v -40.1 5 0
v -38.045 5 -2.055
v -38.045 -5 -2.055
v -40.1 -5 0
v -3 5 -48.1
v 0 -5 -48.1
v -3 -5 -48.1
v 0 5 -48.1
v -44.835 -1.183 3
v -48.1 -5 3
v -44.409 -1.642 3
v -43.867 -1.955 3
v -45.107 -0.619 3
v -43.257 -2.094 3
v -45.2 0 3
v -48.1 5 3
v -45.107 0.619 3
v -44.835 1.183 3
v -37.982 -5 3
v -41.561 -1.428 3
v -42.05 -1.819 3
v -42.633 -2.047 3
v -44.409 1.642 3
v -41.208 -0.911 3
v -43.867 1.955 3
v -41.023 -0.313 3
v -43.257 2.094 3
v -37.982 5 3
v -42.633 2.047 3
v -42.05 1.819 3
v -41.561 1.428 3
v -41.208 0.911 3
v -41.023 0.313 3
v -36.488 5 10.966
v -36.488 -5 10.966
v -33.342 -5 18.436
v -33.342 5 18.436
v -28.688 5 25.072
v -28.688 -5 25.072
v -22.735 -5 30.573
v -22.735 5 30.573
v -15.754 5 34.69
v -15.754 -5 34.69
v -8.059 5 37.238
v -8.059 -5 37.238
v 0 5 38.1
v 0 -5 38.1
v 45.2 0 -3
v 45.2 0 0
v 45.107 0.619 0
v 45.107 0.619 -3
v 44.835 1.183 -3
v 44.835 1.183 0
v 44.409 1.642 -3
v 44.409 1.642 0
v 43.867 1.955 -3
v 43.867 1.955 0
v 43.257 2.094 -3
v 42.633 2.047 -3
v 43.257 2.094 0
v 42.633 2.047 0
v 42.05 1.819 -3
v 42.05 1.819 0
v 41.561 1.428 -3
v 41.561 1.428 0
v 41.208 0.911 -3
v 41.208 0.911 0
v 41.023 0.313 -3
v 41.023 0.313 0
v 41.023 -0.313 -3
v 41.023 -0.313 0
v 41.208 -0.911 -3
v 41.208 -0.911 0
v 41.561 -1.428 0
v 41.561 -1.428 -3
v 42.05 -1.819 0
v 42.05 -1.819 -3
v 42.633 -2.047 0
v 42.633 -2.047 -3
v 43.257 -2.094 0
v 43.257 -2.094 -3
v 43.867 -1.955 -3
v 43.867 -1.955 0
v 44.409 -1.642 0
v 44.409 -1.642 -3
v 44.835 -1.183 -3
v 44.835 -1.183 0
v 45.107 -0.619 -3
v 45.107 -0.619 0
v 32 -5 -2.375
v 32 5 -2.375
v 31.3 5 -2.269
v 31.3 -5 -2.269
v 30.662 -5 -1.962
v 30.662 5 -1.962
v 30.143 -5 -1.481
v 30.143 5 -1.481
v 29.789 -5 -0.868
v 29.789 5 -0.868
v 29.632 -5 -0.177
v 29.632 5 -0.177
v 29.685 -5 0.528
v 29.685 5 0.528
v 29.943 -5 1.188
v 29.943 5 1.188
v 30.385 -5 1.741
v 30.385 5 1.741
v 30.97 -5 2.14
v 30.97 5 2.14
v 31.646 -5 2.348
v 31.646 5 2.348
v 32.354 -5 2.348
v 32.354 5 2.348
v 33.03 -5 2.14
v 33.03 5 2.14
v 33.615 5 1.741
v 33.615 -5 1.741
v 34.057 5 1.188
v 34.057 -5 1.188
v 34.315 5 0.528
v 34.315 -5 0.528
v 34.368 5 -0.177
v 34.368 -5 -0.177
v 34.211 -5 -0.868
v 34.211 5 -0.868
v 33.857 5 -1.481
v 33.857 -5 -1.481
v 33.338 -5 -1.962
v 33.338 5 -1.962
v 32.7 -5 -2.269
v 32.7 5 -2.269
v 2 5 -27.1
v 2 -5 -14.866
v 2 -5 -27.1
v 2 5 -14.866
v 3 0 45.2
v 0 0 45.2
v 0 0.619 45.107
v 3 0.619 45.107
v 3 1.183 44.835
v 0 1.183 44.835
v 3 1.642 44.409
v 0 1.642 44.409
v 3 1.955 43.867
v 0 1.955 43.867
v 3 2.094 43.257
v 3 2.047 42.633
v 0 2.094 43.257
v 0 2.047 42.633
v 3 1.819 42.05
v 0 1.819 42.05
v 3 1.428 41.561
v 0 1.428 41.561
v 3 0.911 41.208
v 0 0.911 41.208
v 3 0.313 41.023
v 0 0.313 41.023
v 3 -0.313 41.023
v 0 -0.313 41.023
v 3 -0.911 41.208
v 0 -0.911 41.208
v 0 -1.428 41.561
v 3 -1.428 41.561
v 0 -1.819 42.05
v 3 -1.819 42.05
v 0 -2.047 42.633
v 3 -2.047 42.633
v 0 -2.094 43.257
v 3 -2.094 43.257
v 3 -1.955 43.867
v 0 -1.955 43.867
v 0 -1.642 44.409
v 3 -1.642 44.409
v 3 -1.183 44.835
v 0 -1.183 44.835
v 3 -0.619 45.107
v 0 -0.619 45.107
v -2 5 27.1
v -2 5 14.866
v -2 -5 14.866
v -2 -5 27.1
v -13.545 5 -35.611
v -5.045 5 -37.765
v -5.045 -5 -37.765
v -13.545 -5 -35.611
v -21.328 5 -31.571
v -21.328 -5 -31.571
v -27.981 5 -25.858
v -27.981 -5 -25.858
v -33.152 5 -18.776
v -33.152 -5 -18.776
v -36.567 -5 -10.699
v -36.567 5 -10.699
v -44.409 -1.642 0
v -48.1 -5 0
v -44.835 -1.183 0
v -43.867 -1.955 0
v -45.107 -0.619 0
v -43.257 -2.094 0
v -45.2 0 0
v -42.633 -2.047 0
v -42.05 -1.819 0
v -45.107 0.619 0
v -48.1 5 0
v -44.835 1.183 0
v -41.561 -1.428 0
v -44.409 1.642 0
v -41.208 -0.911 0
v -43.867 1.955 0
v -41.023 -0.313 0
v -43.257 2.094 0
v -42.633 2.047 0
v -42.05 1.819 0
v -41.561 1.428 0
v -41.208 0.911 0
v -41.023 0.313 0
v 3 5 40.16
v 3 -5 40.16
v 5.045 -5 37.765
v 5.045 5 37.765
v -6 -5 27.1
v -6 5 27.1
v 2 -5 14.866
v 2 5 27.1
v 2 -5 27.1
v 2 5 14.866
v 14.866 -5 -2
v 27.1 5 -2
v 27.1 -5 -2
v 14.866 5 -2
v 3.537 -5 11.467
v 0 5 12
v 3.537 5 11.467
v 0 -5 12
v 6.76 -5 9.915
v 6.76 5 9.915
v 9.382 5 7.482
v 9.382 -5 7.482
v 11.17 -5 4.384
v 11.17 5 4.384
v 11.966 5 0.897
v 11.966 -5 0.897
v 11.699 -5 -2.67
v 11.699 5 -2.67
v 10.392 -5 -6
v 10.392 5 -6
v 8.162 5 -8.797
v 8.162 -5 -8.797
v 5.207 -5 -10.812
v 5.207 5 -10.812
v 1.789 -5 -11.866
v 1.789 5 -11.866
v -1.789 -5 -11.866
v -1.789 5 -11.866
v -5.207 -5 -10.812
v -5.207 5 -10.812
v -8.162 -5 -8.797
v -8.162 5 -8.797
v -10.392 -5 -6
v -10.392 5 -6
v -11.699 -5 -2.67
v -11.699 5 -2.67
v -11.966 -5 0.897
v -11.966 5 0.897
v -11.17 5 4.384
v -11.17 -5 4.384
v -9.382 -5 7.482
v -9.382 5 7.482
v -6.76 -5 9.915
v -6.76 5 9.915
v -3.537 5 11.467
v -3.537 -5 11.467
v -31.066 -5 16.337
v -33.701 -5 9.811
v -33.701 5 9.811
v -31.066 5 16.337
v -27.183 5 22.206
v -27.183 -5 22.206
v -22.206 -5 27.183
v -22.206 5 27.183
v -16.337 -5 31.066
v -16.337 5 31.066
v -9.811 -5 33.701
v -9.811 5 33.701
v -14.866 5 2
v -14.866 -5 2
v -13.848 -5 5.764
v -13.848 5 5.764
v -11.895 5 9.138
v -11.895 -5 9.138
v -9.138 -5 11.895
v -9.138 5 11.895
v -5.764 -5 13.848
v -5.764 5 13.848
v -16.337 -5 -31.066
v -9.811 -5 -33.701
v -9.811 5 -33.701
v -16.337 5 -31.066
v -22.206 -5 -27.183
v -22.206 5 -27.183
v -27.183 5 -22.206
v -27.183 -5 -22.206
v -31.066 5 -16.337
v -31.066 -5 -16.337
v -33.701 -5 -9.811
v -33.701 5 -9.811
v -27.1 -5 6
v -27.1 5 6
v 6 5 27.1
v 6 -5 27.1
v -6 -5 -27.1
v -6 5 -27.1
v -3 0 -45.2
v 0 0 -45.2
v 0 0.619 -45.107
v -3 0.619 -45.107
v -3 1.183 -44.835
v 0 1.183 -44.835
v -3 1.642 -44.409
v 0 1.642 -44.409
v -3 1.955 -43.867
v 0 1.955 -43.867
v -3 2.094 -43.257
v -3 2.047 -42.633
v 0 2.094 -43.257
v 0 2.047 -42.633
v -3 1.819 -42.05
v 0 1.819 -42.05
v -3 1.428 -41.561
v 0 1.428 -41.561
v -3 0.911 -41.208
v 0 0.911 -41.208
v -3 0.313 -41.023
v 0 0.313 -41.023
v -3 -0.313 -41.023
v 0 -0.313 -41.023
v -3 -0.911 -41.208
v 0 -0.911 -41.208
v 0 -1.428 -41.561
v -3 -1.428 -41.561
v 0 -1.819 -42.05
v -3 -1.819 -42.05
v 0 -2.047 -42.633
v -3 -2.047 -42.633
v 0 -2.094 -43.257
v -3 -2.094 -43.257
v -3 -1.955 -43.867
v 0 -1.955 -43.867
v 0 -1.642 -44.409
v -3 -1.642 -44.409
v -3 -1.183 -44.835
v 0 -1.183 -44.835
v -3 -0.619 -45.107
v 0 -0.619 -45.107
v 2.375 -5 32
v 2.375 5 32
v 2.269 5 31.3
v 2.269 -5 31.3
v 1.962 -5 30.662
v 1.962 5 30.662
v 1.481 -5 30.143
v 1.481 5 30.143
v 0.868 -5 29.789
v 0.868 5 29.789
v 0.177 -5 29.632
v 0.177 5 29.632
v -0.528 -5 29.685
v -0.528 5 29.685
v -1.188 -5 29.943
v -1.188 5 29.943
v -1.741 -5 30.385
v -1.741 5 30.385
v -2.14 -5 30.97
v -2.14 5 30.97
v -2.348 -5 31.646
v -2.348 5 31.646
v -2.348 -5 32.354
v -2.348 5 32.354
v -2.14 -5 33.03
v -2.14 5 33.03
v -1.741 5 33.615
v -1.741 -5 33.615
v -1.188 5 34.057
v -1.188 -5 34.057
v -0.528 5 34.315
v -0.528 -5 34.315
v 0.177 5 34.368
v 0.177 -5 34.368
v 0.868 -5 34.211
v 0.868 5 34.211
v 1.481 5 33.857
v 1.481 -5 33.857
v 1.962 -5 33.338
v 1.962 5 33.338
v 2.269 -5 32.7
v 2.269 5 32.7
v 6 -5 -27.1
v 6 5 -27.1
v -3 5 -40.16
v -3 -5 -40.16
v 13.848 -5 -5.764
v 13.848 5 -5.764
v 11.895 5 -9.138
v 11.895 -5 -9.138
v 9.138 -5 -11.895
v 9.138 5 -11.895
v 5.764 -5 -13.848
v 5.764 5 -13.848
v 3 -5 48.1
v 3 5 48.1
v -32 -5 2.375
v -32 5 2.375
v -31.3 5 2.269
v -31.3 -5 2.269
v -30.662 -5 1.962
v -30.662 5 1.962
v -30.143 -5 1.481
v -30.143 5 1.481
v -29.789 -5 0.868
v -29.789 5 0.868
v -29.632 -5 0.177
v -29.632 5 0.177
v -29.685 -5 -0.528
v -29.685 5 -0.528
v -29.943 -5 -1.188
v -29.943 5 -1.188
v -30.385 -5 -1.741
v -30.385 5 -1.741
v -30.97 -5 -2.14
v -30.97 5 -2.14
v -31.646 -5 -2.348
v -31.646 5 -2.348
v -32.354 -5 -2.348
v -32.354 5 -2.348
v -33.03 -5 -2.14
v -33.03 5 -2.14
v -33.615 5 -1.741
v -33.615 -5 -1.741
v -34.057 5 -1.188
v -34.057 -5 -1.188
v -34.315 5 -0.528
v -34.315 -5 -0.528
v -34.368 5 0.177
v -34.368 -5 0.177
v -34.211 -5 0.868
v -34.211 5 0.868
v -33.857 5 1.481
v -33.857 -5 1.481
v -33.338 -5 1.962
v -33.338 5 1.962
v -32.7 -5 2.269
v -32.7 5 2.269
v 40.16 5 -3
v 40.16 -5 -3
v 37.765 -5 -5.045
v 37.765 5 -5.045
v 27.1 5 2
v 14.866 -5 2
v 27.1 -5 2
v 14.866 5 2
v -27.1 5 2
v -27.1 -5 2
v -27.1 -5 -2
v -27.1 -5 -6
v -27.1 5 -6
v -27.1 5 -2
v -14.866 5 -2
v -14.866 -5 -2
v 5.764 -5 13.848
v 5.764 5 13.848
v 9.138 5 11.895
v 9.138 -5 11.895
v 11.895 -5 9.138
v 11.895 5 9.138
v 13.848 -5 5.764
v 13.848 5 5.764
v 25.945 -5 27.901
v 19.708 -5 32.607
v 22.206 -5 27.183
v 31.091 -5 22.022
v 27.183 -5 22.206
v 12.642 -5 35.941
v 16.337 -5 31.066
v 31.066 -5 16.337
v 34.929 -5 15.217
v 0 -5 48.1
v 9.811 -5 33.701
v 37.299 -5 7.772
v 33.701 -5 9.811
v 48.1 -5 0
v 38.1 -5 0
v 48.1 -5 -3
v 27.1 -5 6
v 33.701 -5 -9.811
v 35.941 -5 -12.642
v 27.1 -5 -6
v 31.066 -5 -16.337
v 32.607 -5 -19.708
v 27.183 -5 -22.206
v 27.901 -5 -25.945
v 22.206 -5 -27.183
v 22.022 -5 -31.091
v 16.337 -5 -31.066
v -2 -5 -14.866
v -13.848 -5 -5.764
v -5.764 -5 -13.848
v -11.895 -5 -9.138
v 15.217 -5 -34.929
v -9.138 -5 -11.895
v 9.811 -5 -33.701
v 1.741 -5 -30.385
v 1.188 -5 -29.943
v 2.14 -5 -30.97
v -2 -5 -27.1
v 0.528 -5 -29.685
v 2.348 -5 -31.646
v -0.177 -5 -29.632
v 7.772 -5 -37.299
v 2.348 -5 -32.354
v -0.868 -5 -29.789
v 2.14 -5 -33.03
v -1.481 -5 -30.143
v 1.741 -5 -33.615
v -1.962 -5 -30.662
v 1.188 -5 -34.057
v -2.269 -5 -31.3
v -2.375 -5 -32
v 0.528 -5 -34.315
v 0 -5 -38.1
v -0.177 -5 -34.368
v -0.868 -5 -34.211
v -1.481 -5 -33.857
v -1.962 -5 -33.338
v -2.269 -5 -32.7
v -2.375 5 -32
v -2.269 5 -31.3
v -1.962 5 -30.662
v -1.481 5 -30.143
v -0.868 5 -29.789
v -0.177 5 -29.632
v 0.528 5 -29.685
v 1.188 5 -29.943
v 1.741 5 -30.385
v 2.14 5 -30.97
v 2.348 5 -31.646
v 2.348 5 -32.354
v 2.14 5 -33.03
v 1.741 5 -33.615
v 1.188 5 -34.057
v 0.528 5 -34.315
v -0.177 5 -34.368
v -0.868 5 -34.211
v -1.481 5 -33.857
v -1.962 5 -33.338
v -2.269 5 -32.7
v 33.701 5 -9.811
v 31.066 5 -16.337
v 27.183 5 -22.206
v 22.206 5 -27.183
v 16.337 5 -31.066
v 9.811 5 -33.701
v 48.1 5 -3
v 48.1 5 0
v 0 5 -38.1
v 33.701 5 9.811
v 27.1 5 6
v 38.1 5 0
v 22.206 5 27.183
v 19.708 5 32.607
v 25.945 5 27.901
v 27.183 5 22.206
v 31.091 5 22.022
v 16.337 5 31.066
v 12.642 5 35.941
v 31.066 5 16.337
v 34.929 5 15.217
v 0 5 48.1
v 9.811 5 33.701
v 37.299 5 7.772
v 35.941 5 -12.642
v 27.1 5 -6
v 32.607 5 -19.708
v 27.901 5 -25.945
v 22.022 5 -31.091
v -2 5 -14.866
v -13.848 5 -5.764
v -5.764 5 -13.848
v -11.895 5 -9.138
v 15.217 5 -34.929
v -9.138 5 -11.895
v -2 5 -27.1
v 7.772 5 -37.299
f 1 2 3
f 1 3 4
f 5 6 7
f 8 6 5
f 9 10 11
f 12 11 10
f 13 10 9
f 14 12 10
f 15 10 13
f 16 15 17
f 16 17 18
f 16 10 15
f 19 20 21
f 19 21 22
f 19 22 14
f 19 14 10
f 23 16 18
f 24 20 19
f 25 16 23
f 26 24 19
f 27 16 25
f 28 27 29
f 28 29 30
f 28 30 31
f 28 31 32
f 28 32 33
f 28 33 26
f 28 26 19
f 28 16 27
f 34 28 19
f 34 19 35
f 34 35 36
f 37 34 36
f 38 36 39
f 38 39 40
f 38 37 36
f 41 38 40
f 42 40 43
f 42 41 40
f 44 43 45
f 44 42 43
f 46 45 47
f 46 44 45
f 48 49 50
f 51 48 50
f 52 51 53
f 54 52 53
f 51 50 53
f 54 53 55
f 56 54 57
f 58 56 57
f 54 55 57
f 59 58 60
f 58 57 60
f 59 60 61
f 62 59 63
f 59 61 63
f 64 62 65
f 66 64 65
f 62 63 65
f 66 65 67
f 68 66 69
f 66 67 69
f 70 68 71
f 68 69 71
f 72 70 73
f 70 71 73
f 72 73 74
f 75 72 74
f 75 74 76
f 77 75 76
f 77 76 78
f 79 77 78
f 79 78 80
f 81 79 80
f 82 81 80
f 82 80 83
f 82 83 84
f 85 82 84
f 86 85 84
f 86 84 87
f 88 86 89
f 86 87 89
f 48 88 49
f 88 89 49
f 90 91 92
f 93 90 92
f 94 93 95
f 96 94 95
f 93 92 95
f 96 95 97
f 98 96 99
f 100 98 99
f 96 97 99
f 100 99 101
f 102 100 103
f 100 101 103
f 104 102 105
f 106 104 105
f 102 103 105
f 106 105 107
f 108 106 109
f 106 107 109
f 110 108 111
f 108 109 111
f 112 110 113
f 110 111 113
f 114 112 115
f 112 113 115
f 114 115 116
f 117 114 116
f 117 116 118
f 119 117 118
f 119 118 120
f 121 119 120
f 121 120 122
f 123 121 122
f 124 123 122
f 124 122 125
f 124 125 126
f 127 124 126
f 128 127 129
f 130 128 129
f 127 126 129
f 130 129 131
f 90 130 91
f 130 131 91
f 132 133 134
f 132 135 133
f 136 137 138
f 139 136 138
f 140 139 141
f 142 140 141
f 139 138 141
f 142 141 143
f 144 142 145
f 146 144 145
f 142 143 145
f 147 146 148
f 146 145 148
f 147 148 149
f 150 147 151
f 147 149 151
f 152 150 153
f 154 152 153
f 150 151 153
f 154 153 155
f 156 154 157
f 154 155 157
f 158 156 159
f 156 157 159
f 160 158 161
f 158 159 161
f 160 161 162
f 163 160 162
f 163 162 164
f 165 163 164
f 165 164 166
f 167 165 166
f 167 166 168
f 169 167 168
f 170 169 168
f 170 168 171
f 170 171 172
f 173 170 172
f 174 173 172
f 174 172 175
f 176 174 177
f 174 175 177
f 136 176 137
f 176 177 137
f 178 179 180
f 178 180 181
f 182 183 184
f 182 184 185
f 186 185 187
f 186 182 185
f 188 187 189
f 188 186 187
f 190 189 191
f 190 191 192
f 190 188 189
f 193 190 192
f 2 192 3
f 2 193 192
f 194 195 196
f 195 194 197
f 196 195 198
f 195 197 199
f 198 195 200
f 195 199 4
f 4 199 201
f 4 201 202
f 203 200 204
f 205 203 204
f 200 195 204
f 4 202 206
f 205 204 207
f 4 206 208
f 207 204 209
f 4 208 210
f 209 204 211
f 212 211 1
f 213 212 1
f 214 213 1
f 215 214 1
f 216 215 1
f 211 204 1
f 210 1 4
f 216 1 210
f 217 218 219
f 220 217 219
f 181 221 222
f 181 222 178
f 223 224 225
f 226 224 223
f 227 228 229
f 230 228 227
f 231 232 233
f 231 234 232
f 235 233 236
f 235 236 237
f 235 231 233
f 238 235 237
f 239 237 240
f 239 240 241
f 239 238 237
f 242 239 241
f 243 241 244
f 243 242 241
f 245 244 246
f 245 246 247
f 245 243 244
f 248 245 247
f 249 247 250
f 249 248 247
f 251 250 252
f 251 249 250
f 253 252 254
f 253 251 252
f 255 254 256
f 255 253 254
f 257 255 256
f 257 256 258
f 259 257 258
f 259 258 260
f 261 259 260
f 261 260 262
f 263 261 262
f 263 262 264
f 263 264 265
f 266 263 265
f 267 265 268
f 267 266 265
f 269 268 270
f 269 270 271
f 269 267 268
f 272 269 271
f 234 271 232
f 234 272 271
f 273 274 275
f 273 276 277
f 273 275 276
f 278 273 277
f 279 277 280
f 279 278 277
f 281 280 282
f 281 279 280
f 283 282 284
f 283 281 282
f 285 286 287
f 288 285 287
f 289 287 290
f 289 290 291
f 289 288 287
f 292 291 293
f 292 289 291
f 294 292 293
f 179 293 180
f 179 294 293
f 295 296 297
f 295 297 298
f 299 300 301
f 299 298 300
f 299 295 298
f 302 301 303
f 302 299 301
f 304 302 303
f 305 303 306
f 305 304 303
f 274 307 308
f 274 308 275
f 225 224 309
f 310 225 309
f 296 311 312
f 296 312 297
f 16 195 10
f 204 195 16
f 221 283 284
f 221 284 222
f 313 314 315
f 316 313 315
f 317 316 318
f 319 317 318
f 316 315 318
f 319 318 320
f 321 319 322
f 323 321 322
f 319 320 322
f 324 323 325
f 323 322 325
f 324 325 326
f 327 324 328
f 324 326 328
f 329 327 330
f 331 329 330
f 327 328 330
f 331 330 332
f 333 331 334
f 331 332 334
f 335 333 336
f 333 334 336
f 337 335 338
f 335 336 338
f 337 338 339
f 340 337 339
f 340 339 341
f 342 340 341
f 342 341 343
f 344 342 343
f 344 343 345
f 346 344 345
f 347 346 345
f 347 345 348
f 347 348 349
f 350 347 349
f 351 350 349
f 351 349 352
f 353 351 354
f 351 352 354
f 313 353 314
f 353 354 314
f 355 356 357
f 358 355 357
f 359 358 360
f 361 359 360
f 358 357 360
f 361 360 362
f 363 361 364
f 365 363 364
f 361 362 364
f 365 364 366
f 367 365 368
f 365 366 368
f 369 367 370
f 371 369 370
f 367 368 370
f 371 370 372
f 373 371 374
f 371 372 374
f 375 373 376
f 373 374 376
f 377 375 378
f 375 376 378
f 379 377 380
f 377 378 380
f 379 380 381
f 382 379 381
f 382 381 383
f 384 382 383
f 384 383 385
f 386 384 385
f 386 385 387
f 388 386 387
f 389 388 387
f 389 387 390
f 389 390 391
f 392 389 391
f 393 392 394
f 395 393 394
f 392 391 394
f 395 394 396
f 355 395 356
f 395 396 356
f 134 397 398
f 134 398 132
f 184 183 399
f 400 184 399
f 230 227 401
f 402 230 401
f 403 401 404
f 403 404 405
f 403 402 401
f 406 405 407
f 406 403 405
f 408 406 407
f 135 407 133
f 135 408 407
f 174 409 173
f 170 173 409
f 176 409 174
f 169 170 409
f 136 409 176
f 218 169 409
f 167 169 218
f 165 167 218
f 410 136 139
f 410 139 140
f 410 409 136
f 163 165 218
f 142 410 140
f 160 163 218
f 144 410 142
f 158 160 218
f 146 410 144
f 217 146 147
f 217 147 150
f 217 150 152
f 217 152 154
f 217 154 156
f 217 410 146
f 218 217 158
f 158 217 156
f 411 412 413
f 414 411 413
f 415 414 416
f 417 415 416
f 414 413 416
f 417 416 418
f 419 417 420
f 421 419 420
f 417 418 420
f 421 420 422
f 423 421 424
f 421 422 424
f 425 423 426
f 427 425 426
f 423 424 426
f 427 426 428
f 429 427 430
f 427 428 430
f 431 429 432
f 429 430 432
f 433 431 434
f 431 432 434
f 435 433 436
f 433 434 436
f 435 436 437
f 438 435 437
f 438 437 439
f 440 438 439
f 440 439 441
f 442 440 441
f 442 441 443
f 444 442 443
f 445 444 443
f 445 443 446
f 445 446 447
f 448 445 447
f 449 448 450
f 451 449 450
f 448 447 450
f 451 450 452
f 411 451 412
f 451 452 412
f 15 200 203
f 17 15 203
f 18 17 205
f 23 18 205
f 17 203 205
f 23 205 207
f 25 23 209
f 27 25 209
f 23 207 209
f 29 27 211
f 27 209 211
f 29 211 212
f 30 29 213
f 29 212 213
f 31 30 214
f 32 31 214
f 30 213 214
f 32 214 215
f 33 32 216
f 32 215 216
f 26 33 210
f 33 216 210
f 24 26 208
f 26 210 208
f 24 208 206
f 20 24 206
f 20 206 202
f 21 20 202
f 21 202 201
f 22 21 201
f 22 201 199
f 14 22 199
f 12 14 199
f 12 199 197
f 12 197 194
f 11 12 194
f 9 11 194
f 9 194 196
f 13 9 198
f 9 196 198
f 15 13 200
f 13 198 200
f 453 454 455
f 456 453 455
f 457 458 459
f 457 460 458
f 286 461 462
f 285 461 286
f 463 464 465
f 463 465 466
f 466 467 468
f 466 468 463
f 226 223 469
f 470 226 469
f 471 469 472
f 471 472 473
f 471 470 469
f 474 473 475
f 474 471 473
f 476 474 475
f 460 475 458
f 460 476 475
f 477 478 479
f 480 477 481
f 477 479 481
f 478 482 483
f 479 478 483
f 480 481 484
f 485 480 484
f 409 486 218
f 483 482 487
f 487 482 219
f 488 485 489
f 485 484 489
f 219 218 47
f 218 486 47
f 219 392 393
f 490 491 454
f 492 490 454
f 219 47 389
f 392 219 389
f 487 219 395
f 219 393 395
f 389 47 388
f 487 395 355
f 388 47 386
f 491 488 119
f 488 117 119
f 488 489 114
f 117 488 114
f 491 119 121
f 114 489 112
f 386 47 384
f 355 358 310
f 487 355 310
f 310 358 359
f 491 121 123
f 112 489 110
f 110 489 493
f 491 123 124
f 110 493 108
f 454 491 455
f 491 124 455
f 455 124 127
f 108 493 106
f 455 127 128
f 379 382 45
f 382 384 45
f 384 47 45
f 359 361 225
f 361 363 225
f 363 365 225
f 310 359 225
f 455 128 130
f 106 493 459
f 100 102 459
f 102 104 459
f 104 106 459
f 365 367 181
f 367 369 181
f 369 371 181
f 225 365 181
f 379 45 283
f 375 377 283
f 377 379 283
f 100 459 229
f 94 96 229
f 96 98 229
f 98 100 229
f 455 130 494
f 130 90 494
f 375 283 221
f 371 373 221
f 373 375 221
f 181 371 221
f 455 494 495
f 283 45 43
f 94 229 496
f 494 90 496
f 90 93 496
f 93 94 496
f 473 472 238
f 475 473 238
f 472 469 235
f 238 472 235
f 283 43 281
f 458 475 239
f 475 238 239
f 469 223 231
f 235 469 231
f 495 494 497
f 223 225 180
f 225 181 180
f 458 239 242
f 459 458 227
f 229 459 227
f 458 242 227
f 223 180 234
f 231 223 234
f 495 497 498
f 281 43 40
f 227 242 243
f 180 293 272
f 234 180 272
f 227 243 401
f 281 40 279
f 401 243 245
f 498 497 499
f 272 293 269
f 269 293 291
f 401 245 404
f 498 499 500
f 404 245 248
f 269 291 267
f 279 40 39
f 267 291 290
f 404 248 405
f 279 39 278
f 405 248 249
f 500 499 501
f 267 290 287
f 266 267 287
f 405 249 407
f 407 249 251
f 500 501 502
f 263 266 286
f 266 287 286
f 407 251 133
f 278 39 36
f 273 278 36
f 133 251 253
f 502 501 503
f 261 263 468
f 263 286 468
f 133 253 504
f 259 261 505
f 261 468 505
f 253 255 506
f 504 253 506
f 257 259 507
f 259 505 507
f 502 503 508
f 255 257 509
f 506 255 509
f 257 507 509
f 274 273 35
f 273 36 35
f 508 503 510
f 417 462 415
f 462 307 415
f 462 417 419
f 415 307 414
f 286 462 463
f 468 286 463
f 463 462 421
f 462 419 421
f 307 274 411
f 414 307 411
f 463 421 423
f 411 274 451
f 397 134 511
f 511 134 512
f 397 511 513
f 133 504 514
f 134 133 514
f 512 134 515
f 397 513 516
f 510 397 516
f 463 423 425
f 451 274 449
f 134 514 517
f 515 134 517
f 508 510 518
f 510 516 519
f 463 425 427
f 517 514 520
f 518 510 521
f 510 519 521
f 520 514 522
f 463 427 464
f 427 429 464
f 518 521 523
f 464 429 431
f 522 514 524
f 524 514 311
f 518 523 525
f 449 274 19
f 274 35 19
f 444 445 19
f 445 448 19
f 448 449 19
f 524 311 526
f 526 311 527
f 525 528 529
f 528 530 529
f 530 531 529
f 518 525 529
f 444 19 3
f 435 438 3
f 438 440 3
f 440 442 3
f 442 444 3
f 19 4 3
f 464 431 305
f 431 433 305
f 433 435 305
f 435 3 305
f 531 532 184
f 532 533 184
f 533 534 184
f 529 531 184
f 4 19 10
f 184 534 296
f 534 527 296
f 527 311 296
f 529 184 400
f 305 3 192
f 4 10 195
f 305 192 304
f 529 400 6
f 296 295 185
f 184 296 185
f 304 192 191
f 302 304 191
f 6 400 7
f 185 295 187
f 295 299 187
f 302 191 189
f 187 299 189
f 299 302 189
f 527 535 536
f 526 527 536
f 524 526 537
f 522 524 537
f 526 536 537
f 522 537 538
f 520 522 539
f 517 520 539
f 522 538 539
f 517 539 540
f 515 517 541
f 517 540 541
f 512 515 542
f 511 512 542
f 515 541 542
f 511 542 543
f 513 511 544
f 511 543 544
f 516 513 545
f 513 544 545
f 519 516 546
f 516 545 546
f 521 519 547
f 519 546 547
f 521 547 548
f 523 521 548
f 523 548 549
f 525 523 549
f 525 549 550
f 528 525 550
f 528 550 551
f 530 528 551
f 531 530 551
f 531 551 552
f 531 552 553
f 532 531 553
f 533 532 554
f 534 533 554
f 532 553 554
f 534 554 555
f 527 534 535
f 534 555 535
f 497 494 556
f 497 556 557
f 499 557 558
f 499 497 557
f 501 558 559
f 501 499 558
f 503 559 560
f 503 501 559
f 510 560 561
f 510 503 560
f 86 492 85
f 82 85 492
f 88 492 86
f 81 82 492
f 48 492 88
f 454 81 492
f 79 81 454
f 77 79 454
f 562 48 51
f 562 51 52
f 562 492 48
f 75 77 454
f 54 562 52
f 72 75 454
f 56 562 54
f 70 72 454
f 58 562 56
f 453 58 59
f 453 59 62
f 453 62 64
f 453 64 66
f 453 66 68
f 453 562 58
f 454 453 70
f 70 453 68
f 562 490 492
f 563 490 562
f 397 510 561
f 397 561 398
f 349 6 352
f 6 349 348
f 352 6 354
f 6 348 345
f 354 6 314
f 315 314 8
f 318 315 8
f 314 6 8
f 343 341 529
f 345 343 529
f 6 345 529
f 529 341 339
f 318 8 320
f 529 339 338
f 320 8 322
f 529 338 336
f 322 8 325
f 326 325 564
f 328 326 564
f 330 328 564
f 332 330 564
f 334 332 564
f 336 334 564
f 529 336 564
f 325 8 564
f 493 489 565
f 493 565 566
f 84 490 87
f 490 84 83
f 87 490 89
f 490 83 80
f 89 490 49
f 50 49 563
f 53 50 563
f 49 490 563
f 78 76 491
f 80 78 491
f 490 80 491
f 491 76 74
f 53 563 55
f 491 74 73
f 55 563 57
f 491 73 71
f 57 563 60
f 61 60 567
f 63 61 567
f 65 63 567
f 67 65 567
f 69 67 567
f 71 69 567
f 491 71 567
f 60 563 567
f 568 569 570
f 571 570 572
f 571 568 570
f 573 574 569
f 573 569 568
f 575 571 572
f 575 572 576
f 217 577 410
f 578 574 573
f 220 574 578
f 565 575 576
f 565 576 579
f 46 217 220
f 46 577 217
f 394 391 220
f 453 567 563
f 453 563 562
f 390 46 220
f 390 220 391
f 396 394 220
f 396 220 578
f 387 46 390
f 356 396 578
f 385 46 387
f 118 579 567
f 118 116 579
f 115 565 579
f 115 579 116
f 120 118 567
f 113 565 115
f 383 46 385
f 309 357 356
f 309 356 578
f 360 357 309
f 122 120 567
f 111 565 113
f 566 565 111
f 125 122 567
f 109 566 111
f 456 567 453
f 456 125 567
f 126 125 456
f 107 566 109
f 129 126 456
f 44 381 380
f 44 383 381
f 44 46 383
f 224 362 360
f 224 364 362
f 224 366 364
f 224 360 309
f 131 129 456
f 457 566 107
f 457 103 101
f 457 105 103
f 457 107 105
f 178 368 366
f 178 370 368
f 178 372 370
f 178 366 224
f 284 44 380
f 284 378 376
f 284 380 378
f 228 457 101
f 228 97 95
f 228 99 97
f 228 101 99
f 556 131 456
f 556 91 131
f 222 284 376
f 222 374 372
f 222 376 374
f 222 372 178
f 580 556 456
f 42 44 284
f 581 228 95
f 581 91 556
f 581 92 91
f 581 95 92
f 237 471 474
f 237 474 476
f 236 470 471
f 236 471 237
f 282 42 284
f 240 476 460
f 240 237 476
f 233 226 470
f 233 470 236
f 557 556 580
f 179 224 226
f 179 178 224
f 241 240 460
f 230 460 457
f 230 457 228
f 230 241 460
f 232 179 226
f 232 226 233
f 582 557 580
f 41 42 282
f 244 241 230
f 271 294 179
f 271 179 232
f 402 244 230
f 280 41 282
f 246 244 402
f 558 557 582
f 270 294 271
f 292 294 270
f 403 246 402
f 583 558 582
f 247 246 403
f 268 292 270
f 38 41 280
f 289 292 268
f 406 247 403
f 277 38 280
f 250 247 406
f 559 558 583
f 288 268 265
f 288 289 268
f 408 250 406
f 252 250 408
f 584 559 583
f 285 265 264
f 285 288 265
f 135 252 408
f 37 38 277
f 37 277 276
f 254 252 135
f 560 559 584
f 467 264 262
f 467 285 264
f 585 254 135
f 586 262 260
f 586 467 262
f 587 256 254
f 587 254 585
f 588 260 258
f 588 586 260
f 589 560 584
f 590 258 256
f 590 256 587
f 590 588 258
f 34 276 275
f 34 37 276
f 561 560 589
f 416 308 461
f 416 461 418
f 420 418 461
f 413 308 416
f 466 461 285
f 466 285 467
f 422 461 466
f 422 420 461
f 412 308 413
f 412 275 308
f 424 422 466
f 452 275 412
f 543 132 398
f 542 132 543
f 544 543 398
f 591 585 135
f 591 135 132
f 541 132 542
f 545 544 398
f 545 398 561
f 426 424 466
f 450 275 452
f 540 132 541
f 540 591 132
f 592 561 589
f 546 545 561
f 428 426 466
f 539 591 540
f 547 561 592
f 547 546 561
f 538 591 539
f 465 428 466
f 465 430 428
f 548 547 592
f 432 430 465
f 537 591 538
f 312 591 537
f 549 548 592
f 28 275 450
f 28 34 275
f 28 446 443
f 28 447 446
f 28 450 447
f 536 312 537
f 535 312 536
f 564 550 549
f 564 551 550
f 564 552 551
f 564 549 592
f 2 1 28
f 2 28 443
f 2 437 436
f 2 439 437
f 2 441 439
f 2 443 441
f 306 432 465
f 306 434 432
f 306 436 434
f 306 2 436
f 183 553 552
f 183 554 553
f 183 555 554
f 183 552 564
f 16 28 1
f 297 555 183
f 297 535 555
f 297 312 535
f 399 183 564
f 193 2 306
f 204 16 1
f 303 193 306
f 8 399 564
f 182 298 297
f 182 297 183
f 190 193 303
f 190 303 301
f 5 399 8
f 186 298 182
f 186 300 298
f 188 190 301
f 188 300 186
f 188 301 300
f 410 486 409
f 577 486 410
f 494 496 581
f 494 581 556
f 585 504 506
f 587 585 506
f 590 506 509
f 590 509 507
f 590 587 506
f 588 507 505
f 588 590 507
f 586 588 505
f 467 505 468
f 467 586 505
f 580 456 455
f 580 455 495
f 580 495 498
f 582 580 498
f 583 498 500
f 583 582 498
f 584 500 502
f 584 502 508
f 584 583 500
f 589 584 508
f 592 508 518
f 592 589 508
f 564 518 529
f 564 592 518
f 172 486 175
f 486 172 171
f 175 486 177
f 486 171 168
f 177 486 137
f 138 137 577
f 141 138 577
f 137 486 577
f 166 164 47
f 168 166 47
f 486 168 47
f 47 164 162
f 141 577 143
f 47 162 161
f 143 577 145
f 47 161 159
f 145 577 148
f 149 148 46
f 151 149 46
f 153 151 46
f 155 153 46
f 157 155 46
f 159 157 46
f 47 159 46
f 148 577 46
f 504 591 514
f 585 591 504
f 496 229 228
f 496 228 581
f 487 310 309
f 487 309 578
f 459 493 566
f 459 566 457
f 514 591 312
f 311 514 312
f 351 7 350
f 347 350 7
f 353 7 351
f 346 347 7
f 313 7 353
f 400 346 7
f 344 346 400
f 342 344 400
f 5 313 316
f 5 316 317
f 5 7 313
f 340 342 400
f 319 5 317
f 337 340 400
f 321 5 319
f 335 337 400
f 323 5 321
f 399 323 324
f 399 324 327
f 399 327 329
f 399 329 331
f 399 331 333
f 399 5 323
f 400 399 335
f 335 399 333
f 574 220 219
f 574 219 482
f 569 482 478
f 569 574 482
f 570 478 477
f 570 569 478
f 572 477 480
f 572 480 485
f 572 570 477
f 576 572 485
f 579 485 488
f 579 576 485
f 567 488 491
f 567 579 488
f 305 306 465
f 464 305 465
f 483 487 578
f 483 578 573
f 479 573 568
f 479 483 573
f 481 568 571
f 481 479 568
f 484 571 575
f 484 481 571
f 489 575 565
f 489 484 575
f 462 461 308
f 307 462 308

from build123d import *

# Parameters (mm, degrees)
SKETCH1_R           = 38.1
SKETCH1_R_2         = 35.1
EXTRUDE_THIN1_DEPTH = 5
BOSS_EXTRUDE1_START = -10
BOSS_EXTRUDE1_DEPTH = 10
SKETCH3_R           = 2.375
CUT_EXTRUDE1_DEPTH  = 10
CIRPATTERN1_COUNT   = 4
SKETCH4_W           = 11
SKETCH4_H           = 10
BOSS_EXTRUDE2_DEPTH = 3
SKETCH5_R           = 2.1
CUT_EXTRUDE2_DEPTH  = 3
CIRPATTERN2_COUNT   = 4
CHAMFER1_SIZE       = 2.178281406
CHAMFER1_SIZE_2     = 2
SKETCH6_R           = 12
BOSS_EXTRUDE3_DEPTH = 5


with BuildPart() as part:
    # Sketch1 → Extrude-Thin1 (new, symmetric)
    with BuildSketch(Plane(origin=(0, 0, 0), x_dir=(1, 0, 0), z_dir=(0, 1, 0))):
        Circle(SKETCH1_R)
        Circle(SKETCH1_R_2, mode=Mode.SUBTRACT)
    extrude(amount=EXTRUDE_THIN1_DEPTH, both=True)

    # Sketch2 → Boss-Extrude1 (add)
    with BuildSketch(Plane(origin=(0, 5, 0), x_dir=(1, 0, 0), z_dir=(0, 1, 0)).offset(BOSS_EXTRUDE1_START)):
        with BuildLine():
            Line((-27.1, 6), (-27.1, -6))
            Line((-27.1, -6), (-33.700938133, -9.811053408))
            ThreePointArc((-33.700938133, -9.811053408), (-35.1, 0), (-33.700938133, 9.811053408))
            Line((-33.700938133, 9.811053408), (-27.1, 6))
        make_face()
    boss_extrude1 = extrude(amount=BOSS_EXTRUDE1_DEPTH)

    # Sketch3 → Cut-Extrude1 (cut)
    with BuildSketch(Plane(origin=(0, 5, 0), x_dir=(1, 0, 0), z_dir=(0, 1, 0))):
        with Locations(Location((-32, 0, 0), (0, 0, 270))):
            Circle(SKETCH3_R)
    cut_extrude1 = extrude(amount=-CUT_EXTRUDE1_DEPTH, mode=Mode.SUBTRACT)

    # CirPattern1: Boss-Extrude1, Cut-Extrude1 ×4 about axis
    cirpattern1_axis = Axis((0, 0, 0), (0, 1, 0))
    add([boss_extrude1.rotate(cirpattern1_axis, i * 360 / CIRPATTERN1_COUNT) for i in range(1, CIRPATTERN1_COUNT)])
    add([cut_extrude1.rotate(cirpattern1_axis, i * 360 / CIRPATTERN1_COUNT) for i in range(1, CIRPATTERN1_COUNT)], mode=Mode.SUBTRACT)

    # Sketch4 → Boss-Extrude2 (add)
    with BuildSketch(Plane.XY):
        with Locations((-42.6, 0)):
            Rectangle(SKETCH4_W, SKETCH4_H)
    boss_extrude2 = extrude(amount=BOSS_EXTRUDE2_DEPTH)

    # Sketch5 → Cut-Extrude2 (cut)
    with BuildSketch(Plane(origin=(0, 0, 0), x_dir=(-1, 0, 0), z_dir=(0, 0, -1))):
        with Locations((43.1, 0)):
            Circle(SKETCH5_R)
    cut_extrude2 = extrude(amount=-CUT_EXTRUDE2_DEPTH, mode=Mode.SUBTRACT)

    # CirPattern2: Boss-Extrude2, Cut-Extrude2 ×4 about axis
    cirpattern2_axis = Axis((0, 0, 0), (0, 1, 0))
    add([boss_extrude2.rotate(cirpattern2_axis, i * 360 / CIRPATTERN2_COUNT) for i in range(1, CIRPATTERN2_COUNT)])
    add([cut_extrude2.rotate(cirpattern2_axis, i * 360 / CIRPATTERN2_COUNT) for i in range(1, CIRPATTERN2_COUNT)], mode=Mode.SUBTRACT)

    # Chamfer1
    # the kernel refuses this chamfer: 2.178281406, 2 mm, written as the material it adds along each edge
    with BuildSketch(Plane(origin=(-3, -5, -37.981706123), x_dir=(-0.9944073694019739, 0, 0.10561242199214178), z_dir=(0, 1, 0))) as chamfer1_piece_1:
        with BuildLine():
            Line((2.056235734, 0), (-CHAMFER1_SIZE * 0.105612421996, -CHAMFER1_SIZE * 0.994407369435))
            Line((-CHAMFER1_SIZE * 0.105612421996, -CHAMFER1_SIZE * 0.994407369435), (0, 0))
            ThreePointArc((0, 0), (1.059779898, -0.013861107), (2.056235734, 0))
        make_face()
    extrude(amount=10)
    with BuildSketch(Plane(origin=(37.981706123, -5, -3), x_dir=(1, 0, 0), z_dir=(0, 1, 0)), Plane(origin=(3, -5, 37.981706123), x_dir=(0, 0, 1), z_dir=(0, 1, 0))) as chamfer1_piece_2:
        with BuildLine():
            Line((CHAMFER1_SIZE, 0), (-0.217164036, 2.044735967))
            ThreePointArc((-0.217164036, 2.044735967), (-0.098142335, 1.055316846), (0, 0))
            Line((0, 0), (CHAMFER1_SIZE, 0))
        make_face()
    extrude(amount=10)
    with BuildSketch(Plane(origin=(-38.1, -5, 0), x_dir=(0.026984720913872013, 0, -0.9996358461145741), z_dir=(0, 1, 0))) as chamfer1_piece_3:
        with BuildLine():
            Line((2.056235734, 0), (-CHAMFER1_SIZE_2 * 0.0269847209139, CHAMFER1_SIZE_2 * 0.999635846115))
            Line((-CHAMFER1_SIZE_2 * 0.0269847209139, CHAMFER1_SIZE_2 * 0.999635846115), (0, 0))
            ThreePointArc((0, 0), (1.057186648, 0.013863174), (2.056235734, 0))
        make_face()
    extrude(amount=10)

    # Sketch6 → Boss-Extrude3 (add, symmetric)
    with BuildSketch(Plane(origin=(0, 0, 0), x_dir=(1, 0, 0), z_dir=(0, 1, 0))):
        with BuildLine():
            Line((-2, 27.1), (-2, 14.866068747))
            ThreePointArc((-2, 14.866068747), (-10.606601718, 10.606601718), (-14.866068747, 2))
            Line((-14.866068747, 2), (-27.1, 2))
            Line((-27.1, 2), (-27.1, -2))
            Line((-27.1, -2), (-14.866068747, -2))
            ThreePointArc((-14.866068747, -2), (-10.606601718, -10.606601718), (-2, -14.866068747))
            Line((-2, -14.866068747), (-2, -27.1))
            Line((-2, -27.1), (2, -27.1))
            Line((2, -27.1), (2, -14.866068747))
            ThreePointArc((2, -14.866068747), (10.606601718, -10.606601718), (14.866068747, -2))
            Line((14.866068747, -2), (27.1, -2))
            Line((27.1, -2), (27.1, 2))
            Line((27.1, 2), (14.866068747, 2))
            ThreePointArc((14.866068747, 2), (10.606601718, 10.606601718), (2, 14.866068747))
            Line((2, 14.866068747), (2, 27.1))
            Line((2, 27.1), (-2, 27.1))
        make_face()
        with Locations(Location((0, 0, 0), (0, 0, 270))):
            Circle(SKETCH6_R, mode=Mode.SUBTRACT)
    extrude(amount=BOSS_EXTRUDE3_DEPTH, both=True)


solid = part.part
